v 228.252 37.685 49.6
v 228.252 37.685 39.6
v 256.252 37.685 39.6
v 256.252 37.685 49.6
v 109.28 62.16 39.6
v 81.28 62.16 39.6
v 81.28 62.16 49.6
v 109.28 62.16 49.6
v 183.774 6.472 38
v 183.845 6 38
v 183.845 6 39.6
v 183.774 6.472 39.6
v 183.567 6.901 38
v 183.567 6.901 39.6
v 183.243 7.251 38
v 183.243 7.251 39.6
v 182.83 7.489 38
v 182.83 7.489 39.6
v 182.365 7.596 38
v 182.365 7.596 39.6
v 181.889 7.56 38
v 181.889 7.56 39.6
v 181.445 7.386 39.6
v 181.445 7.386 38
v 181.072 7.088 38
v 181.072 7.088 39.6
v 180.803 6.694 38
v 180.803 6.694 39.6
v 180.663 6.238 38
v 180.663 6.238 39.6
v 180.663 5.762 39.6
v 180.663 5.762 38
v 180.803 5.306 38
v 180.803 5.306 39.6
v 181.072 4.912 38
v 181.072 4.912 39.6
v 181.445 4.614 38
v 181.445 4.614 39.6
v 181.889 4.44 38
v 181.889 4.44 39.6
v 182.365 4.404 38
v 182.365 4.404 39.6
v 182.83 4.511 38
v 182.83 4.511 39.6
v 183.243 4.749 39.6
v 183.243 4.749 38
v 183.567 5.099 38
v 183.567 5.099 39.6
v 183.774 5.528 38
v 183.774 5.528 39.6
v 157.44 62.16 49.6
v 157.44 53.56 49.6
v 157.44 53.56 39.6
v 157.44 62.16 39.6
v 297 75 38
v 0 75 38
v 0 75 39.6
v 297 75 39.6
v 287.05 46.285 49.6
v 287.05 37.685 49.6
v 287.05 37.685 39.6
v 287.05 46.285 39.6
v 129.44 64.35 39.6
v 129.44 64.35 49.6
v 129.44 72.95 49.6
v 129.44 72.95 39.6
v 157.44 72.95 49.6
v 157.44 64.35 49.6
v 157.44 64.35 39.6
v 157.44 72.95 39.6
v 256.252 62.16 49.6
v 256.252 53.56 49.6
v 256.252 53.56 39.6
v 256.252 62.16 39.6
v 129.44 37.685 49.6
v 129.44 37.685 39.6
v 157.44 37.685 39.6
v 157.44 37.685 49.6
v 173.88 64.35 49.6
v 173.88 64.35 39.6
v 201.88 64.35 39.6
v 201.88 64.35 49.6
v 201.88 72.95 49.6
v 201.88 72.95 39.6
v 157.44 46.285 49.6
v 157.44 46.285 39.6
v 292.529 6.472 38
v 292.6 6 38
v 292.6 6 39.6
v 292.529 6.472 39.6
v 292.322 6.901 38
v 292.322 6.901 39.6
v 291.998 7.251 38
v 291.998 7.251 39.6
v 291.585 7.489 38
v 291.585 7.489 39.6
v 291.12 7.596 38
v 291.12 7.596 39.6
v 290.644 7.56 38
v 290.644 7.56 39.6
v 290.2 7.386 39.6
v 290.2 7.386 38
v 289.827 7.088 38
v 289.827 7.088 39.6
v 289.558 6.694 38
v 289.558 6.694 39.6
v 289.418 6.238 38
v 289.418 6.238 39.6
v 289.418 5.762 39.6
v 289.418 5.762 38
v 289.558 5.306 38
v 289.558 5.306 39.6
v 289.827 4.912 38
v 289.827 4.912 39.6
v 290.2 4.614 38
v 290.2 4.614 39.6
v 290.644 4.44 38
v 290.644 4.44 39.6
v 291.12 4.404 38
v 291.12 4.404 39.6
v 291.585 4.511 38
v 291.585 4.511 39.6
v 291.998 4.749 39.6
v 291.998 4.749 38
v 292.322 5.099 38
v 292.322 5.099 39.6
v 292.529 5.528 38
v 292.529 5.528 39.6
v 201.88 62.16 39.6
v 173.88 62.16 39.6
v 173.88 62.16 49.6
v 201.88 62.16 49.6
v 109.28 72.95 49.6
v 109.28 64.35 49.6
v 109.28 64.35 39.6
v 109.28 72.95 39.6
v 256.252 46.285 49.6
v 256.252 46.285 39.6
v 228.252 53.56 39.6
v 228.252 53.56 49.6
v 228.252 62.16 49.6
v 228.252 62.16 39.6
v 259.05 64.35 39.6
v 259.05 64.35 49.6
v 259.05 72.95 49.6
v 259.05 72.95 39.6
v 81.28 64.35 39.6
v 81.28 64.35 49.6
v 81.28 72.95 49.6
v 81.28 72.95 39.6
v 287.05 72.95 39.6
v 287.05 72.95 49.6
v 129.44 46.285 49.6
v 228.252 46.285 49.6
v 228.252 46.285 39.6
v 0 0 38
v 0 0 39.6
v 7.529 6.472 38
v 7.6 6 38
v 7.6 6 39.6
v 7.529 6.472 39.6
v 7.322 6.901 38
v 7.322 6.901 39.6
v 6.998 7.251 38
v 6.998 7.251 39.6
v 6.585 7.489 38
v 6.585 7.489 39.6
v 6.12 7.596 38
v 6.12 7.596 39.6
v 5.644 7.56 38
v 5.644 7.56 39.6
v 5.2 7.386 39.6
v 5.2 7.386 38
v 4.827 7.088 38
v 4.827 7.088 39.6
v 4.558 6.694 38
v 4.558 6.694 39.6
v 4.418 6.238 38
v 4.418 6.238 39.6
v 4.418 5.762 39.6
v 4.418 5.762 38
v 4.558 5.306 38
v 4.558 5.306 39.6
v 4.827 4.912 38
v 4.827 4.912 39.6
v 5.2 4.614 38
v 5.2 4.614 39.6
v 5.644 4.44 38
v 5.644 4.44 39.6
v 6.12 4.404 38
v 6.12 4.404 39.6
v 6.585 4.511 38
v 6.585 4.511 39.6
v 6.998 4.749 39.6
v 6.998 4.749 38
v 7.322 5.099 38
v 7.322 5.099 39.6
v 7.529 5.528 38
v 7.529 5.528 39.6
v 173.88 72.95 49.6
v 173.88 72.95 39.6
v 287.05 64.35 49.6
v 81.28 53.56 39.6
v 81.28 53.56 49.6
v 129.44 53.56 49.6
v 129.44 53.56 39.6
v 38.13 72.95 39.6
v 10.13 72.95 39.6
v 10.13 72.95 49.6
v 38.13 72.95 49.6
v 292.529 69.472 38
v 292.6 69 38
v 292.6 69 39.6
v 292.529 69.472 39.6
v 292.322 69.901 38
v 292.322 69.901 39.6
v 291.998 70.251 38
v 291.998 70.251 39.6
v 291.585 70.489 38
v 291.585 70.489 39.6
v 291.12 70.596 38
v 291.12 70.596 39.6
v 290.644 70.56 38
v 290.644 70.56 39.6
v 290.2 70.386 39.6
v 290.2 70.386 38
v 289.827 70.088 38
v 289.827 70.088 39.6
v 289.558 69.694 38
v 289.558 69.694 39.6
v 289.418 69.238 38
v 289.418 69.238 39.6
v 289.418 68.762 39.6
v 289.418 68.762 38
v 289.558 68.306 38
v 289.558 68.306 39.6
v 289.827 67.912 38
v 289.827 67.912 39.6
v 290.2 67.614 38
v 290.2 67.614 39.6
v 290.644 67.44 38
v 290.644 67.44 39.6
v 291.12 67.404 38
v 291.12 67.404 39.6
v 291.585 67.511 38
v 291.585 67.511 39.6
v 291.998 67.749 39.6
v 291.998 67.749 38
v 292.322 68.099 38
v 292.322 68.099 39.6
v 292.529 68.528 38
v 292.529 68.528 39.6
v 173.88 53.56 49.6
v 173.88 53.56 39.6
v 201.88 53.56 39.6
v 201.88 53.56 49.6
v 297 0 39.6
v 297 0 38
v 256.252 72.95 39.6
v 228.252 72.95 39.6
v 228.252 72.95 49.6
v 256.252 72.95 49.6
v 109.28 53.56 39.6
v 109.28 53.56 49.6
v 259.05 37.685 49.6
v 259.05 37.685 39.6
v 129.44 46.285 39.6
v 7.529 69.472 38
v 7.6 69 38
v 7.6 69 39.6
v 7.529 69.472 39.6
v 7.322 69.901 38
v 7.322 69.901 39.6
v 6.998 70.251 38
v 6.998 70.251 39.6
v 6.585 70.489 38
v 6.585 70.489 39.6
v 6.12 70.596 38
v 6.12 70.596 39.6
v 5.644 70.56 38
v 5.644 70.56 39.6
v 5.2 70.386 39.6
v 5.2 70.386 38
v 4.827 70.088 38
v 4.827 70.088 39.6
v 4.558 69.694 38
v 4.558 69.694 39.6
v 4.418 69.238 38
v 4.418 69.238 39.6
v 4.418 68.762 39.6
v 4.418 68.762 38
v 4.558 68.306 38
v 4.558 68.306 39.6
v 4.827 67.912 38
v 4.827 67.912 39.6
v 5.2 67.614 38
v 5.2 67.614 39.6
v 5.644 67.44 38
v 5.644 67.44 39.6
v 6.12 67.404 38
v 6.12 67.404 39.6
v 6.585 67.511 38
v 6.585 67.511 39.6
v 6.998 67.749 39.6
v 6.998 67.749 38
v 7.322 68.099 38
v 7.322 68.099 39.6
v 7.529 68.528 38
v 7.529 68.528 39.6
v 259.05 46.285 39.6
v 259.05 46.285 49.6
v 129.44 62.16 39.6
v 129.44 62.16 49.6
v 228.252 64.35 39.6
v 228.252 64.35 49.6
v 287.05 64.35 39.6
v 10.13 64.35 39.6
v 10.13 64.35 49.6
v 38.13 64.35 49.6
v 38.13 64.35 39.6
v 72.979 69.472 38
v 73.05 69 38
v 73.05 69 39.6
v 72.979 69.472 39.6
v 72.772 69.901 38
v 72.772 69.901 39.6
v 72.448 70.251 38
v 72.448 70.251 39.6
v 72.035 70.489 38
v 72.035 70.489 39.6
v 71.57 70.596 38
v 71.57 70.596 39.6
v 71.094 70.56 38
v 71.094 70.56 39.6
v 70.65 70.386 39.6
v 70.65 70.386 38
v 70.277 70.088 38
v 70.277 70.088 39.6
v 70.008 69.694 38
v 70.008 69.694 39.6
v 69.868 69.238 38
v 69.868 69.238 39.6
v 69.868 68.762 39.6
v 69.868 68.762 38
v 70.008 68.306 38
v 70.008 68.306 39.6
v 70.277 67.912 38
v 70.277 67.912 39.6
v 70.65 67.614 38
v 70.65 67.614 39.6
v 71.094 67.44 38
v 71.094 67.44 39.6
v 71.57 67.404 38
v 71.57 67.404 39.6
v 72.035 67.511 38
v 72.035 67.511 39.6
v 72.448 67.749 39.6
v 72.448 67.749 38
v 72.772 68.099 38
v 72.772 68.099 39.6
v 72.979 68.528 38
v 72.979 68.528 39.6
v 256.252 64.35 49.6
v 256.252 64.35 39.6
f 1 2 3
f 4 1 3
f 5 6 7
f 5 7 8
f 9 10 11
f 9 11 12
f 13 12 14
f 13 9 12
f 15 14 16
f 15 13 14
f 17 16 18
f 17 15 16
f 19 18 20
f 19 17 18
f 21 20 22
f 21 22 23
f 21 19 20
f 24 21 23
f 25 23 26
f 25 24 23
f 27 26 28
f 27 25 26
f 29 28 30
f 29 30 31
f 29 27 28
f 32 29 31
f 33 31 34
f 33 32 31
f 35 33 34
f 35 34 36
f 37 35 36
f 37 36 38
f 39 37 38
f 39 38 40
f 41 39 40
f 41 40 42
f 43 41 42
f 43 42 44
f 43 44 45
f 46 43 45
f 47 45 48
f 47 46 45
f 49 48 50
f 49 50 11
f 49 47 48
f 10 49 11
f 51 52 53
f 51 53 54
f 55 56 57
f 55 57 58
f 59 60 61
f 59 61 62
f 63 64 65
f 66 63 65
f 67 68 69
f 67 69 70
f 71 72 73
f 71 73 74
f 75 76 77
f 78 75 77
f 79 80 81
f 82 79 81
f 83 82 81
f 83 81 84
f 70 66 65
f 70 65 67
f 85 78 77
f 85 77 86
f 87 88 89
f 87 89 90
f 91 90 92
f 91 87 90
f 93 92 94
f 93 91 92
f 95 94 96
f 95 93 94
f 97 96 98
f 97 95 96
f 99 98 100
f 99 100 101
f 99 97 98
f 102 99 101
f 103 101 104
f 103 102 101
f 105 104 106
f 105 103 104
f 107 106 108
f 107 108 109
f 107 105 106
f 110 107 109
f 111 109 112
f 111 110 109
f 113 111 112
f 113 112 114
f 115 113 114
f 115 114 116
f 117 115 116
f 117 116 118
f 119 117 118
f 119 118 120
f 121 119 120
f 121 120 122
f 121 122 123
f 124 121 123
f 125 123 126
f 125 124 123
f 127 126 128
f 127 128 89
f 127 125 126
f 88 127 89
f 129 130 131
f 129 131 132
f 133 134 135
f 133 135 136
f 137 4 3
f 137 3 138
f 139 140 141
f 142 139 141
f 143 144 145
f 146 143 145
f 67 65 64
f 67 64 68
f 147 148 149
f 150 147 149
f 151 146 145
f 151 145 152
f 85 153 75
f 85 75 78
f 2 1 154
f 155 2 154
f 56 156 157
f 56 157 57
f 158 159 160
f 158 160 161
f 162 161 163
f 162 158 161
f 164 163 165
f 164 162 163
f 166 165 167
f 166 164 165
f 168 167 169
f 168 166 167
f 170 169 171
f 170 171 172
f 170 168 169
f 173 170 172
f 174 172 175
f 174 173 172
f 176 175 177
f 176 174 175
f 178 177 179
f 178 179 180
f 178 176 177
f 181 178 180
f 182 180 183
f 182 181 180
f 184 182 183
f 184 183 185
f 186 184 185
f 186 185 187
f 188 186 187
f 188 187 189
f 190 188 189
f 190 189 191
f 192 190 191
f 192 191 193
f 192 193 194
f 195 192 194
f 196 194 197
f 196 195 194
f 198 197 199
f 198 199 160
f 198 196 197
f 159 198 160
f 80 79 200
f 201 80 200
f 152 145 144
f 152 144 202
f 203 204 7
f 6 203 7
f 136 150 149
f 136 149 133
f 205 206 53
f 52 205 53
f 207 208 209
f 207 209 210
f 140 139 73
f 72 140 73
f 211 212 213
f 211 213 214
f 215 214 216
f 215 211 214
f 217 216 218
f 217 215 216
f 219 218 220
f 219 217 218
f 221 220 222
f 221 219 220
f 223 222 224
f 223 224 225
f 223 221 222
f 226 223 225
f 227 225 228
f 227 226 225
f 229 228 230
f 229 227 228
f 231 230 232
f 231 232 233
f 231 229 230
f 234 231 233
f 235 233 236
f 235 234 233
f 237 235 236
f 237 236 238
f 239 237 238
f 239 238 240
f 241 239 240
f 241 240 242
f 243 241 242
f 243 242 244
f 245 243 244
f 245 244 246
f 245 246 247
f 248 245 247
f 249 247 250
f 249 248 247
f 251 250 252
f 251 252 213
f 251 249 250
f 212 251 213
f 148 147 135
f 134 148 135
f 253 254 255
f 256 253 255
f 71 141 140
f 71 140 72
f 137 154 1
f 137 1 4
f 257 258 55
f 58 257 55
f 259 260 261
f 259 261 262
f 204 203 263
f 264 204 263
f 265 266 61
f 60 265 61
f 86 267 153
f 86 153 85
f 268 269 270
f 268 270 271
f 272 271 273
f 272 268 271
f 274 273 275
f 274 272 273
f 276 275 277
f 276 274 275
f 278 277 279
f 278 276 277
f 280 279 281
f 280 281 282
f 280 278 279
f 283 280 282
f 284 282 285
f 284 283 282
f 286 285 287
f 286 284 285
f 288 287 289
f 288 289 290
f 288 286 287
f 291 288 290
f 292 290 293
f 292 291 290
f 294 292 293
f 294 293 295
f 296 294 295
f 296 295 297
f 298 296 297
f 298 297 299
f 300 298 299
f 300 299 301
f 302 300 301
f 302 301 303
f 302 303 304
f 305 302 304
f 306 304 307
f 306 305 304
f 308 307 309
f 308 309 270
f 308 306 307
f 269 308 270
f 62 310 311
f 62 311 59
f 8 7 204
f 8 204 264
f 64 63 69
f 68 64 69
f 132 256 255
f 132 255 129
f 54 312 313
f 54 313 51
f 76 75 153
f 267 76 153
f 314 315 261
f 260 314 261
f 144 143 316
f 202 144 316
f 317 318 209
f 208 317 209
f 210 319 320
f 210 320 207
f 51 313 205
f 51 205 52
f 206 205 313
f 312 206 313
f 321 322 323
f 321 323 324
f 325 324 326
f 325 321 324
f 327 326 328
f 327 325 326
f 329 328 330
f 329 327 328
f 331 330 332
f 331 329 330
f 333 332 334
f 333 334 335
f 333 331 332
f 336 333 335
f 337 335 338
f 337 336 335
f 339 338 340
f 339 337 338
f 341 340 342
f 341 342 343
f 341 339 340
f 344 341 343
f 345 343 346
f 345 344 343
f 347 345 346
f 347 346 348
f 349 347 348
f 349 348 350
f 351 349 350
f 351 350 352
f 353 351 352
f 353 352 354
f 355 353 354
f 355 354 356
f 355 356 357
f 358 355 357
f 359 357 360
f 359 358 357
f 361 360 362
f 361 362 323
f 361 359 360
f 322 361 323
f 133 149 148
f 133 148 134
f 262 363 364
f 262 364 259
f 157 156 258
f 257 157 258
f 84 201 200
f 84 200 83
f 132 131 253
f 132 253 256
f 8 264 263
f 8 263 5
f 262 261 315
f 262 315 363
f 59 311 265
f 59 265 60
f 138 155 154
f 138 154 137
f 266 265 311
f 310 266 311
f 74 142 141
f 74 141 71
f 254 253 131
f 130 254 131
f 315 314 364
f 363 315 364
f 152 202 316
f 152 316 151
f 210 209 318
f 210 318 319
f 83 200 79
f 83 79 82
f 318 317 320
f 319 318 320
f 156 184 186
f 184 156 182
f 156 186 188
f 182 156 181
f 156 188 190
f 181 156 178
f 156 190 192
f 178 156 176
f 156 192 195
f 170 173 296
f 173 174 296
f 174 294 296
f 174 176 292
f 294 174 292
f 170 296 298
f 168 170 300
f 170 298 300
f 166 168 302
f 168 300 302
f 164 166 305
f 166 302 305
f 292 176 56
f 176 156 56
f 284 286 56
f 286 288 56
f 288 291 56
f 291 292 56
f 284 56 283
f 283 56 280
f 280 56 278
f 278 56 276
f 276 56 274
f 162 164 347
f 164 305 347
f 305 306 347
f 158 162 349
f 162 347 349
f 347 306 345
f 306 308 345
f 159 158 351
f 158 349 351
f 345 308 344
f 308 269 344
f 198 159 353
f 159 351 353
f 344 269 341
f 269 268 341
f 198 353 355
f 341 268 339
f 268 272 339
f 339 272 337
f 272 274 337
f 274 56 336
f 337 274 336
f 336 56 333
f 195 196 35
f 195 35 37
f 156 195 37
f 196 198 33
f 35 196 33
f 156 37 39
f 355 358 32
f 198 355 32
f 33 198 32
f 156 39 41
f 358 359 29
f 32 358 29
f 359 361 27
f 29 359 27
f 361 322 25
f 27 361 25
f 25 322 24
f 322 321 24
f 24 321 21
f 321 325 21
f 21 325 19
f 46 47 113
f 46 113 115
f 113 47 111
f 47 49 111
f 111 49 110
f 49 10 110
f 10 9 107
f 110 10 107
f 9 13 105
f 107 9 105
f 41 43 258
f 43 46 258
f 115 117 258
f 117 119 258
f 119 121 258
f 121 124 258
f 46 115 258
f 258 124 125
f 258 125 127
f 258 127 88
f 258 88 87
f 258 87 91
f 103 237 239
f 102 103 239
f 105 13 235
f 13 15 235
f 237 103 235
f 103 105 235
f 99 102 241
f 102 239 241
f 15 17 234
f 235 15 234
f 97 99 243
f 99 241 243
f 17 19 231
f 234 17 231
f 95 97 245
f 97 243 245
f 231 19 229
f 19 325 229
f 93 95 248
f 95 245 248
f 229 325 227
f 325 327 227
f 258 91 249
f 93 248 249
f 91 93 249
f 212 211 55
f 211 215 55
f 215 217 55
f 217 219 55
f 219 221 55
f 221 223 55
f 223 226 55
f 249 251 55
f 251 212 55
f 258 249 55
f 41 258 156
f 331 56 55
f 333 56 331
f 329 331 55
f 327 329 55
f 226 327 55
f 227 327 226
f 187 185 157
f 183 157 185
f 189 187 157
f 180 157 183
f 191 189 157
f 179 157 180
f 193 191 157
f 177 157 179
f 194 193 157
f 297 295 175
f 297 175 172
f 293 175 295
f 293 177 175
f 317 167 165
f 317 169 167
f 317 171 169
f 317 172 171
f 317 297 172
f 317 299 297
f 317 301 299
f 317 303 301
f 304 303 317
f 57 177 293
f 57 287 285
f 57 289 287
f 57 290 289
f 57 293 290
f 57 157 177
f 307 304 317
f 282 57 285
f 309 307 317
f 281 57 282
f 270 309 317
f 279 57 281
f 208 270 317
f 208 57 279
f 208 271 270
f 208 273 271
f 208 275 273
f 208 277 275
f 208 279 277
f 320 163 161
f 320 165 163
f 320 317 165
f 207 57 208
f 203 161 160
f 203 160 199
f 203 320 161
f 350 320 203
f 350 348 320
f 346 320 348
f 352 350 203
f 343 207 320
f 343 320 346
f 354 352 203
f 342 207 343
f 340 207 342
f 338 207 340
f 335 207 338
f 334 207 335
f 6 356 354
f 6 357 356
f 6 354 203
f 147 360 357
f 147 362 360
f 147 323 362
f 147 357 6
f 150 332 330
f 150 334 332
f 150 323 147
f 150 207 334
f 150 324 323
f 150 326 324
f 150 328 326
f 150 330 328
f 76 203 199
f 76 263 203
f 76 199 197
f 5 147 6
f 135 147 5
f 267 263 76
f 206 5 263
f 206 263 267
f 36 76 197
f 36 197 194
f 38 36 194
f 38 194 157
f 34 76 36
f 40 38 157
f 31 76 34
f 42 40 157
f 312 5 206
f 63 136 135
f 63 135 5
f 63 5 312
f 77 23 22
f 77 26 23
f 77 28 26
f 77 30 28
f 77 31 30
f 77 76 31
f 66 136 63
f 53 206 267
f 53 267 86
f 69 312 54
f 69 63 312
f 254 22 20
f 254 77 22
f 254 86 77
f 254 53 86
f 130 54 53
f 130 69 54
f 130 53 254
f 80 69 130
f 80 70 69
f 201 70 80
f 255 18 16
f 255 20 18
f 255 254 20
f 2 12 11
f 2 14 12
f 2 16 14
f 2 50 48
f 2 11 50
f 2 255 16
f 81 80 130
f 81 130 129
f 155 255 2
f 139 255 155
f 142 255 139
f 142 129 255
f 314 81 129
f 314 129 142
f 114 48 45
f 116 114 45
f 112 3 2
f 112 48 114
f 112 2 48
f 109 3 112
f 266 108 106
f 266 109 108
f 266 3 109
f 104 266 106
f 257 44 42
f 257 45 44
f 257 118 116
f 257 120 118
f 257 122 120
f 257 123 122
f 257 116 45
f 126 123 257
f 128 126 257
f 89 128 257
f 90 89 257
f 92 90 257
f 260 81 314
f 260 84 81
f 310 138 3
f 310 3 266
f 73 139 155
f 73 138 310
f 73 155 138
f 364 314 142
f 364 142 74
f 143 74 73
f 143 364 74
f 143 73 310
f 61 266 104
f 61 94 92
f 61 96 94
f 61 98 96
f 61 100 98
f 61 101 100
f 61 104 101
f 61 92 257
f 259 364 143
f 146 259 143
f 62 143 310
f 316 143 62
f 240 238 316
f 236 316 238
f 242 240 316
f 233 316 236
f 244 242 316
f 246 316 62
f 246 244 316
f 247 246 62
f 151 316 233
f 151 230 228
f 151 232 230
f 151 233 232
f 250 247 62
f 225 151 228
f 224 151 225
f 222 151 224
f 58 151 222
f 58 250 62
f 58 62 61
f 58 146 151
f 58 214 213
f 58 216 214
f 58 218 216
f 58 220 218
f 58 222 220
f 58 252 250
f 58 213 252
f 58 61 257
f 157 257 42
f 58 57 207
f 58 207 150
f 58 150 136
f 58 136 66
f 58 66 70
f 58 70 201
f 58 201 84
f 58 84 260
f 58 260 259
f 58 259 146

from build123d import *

# Parameters (mm, degrees)
SKETCH004_W      = 297
SKETCH004_H      = 75
SKETCH004_R      = 1.6
EXTRUDE004_DEPTH = 1.6
SKETCH005_W      = 28
SKETCH005_H      = 8.6
EXTRUDE005_DEPTH = 10


with BuildPart() as extrude004:
    # Sketch004 → Extrude004 (new body)
    with BuildSketch(Plane.XY.offset(38)):
        with Locations((148.5, 37.5)):
            Rectangle(SKETCH004_W, SKETCH004_H)
        with Locations((6, 69)):
            Circle(SKETCH004_R, mode=Mode.SUBTRACT)
        with Locations((6, 6)):
            Circle(SKETCH004_R, mode=Mode.SUBTRACT)
        with Locations((291, 69)):
            Circle(SKETCH004_R, mode=Mode.SUBTRACT)
        with Locations((291, 6)):
            Circle(SKETCH004_R, mode=Mode.SUBTRACT)
        with Locations((71.45, 69)):
            Circle(SKETCH004_R, mode=Mode.SUBTRACT)
        with Locations((182.245, 6)):
            Circle(SKETCH004_R, mode=Mode.SUBTRACT)
    extrude(amount=EXTRUDE004_DEPTH)


with BuildPart() as sysbus:
    # Sketch005 (on Face12 of Extrude004) → Extrude005 (new body)
    with BuildSketch(Plane.XY.offset(39.6)):
        with Locations((187.88, 68.65)):
            Rectangle(SKETCH005_W, SKETCH005_H)
        with Locations((187.88, 57.86)):
            Rectangle(SKETCH005_W, SKETCH005_H)
        with Locations((143.44, 68.65)):
            Rectangle(SKETCH005_W, SKETCH005_H)
        with Locations((143.44, 57.86)):
            Rectangle(SKETCH005_W, SKETCH005_H)
        with Locations((143.44, 41.985)):
            Rectangle(SKETCH005_W, SKETCH005_H)
        with Locations((24.13, 68.65)):
            Rectangle(SKETCH005_W, SKETCH005_H)
        with Locations((273.05, 68.65)):
            Rectangle(SKETCH005_W, SKETCH005_H)
        with Locations((273.05, 41.985)):
            Rectangle(SKETCH005_W, SKETCH005_H)
        with Locations((95.28, 68.65)):
            Rectangle(SKETCH005_W, SKETCH005_H)
        with Locations((95.28, 57.86)):
            Rectangle(SKETCH005_W, SKETCH005_H)
        with Locations((242.252, 68.65)):
            Rectangle(SKETCH005_W, SKETCH005_H)
        with Locations((242.252, 57.86)):
            Rectangle(SKETCH005_W, SKETCH005_H)
        with Locations((242.252, 41.985)):
            Rectangle(SKETCH005_W, SKETCH005_H)
    extrude(amount=EXTRUDE005_DEPTH)

    # Fusion001: union Extrude004
    add(extrude004.part)


solid = sysbus.part
